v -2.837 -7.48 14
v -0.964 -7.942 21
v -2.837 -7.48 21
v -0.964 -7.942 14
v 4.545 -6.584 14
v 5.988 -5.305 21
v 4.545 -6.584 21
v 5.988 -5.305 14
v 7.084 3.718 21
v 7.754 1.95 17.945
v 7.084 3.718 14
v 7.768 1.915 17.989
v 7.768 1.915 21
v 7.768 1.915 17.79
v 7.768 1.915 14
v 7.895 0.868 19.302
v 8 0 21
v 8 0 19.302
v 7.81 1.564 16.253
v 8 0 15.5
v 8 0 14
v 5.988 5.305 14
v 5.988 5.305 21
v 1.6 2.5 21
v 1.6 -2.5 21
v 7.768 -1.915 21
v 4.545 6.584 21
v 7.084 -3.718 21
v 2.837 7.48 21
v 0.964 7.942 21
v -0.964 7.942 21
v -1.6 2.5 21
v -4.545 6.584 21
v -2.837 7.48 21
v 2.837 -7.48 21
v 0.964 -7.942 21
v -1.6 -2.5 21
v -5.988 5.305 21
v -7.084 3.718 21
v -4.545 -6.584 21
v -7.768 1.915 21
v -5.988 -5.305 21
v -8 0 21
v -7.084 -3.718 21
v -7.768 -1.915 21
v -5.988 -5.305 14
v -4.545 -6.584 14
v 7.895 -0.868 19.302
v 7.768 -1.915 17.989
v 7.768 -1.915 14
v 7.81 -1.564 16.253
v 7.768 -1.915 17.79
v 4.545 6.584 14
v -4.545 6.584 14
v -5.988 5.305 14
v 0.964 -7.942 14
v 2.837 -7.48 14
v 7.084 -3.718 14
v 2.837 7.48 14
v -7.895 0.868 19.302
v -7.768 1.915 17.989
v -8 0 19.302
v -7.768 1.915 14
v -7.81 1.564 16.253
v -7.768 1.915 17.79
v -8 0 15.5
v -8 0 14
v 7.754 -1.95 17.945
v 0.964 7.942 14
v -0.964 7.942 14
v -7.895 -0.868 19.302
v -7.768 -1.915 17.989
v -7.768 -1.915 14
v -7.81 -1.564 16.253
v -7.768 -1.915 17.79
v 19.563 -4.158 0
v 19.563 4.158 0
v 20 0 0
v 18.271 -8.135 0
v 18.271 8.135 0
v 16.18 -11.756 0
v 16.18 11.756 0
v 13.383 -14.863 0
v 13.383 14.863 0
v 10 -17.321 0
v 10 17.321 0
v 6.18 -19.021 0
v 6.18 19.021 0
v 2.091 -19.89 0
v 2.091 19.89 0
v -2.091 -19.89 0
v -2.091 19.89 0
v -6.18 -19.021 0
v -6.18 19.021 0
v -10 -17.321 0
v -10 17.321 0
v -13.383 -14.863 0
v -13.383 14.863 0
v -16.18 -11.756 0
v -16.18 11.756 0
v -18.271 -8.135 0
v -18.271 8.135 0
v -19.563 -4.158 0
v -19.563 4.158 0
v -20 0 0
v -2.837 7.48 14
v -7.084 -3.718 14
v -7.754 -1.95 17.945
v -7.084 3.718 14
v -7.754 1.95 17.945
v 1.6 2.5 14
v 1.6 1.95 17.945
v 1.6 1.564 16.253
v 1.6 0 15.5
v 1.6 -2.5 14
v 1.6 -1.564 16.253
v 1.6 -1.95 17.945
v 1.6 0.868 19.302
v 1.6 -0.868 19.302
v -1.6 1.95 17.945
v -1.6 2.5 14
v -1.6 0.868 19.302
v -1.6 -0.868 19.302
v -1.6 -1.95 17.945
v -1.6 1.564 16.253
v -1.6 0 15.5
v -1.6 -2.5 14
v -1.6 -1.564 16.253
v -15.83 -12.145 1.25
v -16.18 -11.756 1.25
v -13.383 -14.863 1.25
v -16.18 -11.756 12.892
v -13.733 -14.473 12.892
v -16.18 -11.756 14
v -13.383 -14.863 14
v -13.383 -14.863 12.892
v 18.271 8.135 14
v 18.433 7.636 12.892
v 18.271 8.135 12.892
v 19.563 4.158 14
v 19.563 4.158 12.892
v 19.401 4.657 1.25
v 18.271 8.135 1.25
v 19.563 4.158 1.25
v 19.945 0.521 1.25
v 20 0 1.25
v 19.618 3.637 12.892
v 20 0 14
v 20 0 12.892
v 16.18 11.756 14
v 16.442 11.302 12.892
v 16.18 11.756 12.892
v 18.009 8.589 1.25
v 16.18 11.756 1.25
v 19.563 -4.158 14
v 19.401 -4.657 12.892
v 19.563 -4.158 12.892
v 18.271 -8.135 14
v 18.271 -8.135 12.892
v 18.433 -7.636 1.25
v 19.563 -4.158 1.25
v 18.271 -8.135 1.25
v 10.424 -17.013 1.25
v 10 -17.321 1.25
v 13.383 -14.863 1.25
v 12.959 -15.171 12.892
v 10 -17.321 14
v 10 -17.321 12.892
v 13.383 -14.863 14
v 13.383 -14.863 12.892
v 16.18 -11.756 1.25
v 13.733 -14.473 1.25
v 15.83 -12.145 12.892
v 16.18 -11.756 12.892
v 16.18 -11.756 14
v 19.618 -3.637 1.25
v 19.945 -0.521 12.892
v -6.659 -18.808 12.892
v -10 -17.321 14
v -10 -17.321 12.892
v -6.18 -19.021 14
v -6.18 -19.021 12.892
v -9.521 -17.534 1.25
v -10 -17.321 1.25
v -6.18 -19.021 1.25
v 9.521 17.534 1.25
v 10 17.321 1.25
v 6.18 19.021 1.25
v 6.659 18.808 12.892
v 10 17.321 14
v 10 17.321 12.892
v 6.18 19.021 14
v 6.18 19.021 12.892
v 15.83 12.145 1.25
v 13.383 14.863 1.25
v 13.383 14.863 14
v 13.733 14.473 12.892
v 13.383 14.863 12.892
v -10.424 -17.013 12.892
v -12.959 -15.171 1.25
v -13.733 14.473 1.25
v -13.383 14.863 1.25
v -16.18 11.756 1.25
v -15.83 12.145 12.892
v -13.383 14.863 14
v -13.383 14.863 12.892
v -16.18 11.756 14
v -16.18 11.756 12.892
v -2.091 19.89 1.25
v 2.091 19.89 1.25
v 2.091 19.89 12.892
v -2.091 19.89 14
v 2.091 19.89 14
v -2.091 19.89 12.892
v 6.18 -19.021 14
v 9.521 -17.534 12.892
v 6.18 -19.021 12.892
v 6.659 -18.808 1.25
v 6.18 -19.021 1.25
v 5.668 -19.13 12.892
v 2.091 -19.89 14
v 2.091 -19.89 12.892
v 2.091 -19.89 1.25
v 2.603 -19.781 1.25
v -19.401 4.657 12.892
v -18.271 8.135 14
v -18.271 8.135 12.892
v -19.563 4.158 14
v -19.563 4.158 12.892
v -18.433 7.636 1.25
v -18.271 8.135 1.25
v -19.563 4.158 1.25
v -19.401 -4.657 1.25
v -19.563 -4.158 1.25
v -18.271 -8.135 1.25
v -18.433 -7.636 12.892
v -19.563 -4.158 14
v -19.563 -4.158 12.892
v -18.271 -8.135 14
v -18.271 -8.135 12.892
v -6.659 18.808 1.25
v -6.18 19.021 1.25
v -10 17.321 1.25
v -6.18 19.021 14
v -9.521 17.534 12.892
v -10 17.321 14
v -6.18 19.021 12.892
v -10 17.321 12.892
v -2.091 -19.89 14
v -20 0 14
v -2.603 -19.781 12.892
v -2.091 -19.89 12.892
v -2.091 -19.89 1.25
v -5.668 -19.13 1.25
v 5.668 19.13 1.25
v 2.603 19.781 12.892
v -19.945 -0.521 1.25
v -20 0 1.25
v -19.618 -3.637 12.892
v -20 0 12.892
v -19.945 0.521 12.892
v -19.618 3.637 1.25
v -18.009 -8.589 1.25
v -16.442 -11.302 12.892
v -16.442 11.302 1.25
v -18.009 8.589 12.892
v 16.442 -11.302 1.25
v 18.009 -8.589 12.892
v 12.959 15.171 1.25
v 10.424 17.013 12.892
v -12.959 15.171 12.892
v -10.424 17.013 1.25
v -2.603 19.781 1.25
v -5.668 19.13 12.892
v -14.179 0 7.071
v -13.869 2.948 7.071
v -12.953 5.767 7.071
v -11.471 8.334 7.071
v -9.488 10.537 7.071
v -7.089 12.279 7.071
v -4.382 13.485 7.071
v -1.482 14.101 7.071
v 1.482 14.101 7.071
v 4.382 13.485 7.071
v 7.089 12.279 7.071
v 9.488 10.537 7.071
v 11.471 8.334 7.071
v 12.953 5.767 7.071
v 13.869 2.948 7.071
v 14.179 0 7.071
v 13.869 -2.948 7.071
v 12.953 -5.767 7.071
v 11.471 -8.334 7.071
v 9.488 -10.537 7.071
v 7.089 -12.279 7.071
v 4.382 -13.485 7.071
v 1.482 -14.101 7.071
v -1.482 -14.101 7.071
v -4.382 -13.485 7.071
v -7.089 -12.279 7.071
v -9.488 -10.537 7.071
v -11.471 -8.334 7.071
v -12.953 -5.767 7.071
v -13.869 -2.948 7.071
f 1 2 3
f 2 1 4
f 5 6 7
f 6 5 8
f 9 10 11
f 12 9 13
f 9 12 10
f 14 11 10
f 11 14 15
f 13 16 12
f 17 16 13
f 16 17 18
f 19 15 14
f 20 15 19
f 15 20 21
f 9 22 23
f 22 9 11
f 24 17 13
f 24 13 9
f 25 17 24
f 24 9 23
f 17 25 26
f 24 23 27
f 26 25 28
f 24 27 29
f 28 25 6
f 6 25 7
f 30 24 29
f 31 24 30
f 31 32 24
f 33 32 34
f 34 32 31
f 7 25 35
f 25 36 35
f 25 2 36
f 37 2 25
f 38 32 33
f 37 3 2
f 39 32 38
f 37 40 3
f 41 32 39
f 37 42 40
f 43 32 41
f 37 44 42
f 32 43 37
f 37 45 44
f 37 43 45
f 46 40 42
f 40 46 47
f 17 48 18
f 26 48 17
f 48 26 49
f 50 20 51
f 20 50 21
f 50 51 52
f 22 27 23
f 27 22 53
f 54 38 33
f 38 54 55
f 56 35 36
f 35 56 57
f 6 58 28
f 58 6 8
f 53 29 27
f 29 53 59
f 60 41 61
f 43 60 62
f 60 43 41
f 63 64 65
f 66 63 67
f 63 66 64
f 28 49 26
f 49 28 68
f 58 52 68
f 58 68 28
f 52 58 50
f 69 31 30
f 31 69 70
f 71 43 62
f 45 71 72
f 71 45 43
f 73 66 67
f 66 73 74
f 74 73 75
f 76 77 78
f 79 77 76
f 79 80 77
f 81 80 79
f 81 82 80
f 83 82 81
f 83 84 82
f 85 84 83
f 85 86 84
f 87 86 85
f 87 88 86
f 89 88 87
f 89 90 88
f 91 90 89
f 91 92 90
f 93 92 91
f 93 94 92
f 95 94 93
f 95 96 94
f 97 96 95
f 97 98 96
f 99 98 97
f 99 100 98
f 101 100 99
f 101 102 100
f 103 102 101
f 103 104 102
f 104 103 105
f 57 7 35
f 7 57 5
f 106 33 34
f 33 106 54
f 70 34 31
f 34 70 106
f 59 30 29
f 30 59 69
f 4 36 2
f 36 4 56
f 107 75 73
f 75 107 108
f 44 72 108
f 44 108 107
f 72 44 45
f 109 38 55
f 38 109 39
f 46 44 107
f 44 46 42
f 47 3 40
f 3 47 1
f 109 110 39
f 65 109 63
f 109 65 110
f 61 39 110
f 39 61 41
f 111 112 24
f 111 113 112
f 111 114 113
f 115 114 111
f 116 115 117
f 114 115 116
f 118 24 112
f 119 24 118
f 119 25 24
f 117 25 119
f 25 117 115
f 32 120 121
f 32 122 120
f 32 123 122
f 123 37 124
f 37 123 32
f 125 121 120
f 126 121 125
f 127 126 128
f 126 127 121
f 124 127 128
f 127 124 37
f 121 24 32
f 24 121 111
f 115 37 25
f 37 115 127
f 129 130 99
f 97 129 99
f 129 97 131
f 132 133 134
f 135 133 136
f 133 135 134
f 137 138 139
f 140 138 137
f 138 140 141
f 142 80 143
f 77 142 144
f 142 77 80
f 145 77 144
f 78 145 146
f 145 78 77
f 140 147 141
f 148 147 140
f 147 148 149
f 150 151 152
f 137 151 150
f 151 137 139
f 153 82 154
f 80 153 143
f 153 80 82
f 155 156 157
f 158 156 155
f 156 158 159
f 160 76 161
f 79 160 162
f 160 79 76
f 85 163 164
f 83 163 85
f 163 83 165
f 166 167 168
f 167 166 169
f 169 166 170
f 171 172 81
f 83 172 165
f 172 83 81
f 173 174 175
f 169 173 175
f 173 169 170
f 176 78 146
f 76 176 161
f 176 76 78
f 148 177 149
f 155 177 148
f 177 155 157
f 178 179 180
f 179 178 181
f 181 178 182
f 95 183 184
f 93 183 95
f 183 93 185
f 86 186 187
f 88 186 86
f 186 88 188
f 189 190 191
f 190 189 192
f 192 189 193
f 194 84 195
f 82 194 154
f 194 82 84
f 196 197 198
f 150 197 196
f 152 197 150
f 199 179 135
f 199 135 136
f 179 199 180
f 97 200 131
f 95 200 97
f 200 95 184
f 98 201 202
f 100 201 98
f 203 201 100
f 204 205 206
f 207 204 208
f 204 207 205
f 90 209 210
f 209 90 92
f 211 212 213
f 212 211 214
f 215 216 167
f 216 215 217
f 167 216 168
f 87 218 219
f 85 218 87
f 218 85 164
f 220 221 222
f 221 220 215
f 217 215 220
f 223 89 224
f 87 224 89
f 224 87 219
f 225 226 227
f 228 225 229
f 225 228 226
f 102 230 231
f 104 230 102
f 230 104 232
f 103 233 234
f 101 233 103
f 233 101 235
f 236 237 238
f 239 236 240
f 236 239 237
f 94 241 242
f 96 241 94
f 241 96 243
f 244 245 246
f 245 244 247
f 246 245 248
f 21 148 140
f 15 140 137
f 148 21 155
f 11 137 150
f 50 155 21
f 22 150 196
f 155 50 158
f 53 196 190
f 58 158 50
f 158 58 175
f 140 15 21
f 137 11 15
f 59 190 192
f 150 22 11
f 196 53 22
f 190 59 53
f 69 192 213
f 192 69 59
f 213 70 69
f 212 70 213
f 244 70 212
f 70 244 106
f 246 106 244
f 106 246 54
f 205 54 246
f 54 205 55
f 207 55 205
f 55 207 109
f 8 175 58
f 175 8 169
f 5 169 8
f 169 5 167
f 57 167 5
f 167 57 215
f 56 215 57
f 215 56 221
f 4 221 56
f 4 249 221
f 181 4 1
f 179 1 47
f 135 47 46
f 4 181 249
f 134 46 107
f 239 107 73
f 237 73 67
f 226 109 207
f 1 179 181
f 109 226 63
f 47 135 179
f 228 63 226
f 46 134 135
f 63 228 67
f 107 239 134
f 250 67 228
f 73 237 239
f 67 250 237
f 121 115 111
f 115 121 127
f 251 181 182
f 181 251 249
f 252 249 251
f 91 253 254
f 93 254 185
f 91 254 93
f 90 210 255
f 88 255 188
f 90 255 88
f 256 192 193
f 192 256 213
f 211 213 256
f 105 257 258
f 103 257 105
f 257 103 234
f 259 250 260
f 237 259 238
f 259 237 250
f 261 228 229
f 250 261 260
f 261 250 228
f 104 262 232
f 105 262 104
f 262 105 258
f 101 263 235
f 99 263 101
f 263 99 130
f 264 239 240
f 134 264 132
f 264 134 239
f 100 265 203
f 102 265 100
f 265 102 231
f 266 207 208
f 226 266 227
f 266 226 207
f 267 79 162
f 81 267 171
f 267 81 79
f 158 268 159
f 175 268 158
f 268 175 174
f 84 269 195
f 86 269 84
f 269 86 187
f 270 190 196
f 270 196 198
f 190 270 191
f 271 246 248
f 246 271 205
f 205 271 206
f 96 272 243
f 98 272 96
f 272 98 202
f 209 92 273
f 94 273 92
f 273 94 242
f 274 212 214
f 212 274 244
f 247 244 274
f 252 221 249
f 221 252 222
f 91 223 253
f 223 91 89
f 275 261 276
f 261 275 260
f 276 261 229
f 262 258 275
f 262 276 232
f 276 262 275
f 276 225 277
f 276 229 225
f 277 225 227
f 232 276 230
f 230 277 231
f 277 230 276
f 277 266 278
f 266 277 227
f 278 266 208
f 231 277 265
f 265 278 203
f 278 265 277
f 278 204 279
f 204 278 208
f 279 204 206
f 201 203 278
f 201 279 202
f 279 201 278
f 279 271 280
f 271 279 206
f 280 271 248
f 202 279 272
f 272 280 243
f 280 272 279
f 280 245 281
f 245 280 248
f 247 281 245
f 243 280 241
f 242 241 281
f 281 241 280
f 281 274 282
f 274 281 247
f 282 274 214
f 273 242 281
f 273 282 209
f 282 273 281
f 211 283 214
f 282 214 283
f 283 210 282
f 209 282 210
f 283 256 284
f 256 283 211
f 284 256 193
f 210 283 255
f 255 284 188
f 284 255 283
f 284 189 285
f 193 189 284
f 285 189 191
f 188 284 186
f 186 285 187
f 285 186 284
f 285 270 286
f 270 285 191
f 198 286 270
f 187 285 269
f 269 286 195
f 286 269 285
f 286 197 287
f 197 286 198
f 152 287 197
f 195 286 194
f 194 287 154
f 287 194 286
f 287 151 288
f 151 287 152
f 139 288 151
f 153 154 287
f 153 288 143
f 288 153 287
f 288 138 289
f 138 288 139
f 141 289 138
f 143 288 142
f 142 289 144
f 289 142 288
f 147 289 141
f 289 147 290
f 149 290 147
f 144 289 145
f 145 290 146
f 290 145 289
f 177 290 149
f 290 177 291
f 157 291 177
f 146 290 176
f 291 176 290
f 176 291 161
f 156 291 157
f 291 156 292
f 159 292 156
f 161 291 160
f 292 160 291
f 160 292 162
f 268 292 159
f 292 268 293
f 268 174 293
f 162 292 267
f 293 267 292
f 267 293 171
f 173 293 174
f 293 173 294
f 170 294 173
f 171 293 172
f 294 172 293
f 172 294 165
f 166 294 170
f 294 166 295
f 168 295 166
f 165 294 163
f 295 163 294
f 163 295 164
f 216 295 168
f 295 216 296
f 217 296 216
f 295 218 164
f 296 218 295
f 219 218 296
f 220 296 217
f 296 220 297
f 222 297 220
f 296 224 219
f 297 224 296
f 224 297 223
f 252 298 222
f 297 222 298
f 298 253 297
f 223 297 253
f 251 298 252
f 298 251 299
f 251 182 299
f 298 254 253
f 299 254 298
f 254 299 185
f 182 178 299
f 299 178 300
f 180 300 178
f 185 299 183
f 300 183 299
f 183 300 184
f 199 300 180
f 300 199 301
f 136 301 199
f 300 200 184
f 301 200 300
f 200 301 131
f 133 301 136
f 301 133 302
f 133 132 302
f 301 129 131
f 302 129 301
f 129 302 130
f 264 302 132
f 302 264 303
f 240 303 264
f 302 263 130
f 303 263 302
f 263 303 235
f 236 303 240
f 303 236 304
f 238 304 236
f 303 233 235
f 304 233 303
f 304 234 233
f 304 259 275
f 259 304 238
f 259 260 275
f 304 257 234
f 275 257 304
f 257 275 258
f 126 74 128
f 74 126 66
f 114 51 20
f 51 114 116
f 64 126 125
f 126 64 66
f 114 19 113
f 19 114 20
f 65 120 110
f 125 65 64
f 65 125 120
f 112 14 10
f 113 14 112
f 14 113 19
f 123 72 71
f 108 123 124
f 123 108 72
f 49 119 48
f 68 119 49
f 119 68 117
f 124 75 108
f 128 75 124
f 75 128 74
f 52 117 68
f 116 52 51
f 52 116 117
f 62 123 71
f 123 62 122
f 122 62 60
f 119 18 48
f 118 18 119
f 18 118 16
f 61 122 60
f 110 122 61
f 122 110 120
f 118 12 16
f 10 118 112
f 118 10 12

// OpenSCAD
hub_z = 7;
hub_r = 8;
hub_a = 3.2;
hub_b = 5;

wheel_z = 14;
wheel_r = 20;

v_depth = 10;

module body() {
 carve_x = 10;
 total_z = hub_z + wheel_z;
 difference() {
   cylinder(h=total_z,r=hub_r);
   translate([-hub_a/2,-hub_b/2,0]) {
     cube([hub_a,hub_b,total_z], 1);
   }
 }
 cylinder(h=wheel_z,r=wheel_r);
}

module screws() {
  translate([0,0,wheel_z+(hub_z/2)]) 
    rotate(90,[0,1,0]) 
      translate([0,0,-15]) 
        cylinder(h=30,r=2);
}

module groove() {
 rotate_extrude(convexity = 100) 
   translate([24.25-3, 0, 0])
     rotate(45)
       square([v_depth,v_depth],0); 
}

module no_screws() {
  difference() {
    body();
    groove();
  }
}

difference() {
  no_screws();
  screws();
}
